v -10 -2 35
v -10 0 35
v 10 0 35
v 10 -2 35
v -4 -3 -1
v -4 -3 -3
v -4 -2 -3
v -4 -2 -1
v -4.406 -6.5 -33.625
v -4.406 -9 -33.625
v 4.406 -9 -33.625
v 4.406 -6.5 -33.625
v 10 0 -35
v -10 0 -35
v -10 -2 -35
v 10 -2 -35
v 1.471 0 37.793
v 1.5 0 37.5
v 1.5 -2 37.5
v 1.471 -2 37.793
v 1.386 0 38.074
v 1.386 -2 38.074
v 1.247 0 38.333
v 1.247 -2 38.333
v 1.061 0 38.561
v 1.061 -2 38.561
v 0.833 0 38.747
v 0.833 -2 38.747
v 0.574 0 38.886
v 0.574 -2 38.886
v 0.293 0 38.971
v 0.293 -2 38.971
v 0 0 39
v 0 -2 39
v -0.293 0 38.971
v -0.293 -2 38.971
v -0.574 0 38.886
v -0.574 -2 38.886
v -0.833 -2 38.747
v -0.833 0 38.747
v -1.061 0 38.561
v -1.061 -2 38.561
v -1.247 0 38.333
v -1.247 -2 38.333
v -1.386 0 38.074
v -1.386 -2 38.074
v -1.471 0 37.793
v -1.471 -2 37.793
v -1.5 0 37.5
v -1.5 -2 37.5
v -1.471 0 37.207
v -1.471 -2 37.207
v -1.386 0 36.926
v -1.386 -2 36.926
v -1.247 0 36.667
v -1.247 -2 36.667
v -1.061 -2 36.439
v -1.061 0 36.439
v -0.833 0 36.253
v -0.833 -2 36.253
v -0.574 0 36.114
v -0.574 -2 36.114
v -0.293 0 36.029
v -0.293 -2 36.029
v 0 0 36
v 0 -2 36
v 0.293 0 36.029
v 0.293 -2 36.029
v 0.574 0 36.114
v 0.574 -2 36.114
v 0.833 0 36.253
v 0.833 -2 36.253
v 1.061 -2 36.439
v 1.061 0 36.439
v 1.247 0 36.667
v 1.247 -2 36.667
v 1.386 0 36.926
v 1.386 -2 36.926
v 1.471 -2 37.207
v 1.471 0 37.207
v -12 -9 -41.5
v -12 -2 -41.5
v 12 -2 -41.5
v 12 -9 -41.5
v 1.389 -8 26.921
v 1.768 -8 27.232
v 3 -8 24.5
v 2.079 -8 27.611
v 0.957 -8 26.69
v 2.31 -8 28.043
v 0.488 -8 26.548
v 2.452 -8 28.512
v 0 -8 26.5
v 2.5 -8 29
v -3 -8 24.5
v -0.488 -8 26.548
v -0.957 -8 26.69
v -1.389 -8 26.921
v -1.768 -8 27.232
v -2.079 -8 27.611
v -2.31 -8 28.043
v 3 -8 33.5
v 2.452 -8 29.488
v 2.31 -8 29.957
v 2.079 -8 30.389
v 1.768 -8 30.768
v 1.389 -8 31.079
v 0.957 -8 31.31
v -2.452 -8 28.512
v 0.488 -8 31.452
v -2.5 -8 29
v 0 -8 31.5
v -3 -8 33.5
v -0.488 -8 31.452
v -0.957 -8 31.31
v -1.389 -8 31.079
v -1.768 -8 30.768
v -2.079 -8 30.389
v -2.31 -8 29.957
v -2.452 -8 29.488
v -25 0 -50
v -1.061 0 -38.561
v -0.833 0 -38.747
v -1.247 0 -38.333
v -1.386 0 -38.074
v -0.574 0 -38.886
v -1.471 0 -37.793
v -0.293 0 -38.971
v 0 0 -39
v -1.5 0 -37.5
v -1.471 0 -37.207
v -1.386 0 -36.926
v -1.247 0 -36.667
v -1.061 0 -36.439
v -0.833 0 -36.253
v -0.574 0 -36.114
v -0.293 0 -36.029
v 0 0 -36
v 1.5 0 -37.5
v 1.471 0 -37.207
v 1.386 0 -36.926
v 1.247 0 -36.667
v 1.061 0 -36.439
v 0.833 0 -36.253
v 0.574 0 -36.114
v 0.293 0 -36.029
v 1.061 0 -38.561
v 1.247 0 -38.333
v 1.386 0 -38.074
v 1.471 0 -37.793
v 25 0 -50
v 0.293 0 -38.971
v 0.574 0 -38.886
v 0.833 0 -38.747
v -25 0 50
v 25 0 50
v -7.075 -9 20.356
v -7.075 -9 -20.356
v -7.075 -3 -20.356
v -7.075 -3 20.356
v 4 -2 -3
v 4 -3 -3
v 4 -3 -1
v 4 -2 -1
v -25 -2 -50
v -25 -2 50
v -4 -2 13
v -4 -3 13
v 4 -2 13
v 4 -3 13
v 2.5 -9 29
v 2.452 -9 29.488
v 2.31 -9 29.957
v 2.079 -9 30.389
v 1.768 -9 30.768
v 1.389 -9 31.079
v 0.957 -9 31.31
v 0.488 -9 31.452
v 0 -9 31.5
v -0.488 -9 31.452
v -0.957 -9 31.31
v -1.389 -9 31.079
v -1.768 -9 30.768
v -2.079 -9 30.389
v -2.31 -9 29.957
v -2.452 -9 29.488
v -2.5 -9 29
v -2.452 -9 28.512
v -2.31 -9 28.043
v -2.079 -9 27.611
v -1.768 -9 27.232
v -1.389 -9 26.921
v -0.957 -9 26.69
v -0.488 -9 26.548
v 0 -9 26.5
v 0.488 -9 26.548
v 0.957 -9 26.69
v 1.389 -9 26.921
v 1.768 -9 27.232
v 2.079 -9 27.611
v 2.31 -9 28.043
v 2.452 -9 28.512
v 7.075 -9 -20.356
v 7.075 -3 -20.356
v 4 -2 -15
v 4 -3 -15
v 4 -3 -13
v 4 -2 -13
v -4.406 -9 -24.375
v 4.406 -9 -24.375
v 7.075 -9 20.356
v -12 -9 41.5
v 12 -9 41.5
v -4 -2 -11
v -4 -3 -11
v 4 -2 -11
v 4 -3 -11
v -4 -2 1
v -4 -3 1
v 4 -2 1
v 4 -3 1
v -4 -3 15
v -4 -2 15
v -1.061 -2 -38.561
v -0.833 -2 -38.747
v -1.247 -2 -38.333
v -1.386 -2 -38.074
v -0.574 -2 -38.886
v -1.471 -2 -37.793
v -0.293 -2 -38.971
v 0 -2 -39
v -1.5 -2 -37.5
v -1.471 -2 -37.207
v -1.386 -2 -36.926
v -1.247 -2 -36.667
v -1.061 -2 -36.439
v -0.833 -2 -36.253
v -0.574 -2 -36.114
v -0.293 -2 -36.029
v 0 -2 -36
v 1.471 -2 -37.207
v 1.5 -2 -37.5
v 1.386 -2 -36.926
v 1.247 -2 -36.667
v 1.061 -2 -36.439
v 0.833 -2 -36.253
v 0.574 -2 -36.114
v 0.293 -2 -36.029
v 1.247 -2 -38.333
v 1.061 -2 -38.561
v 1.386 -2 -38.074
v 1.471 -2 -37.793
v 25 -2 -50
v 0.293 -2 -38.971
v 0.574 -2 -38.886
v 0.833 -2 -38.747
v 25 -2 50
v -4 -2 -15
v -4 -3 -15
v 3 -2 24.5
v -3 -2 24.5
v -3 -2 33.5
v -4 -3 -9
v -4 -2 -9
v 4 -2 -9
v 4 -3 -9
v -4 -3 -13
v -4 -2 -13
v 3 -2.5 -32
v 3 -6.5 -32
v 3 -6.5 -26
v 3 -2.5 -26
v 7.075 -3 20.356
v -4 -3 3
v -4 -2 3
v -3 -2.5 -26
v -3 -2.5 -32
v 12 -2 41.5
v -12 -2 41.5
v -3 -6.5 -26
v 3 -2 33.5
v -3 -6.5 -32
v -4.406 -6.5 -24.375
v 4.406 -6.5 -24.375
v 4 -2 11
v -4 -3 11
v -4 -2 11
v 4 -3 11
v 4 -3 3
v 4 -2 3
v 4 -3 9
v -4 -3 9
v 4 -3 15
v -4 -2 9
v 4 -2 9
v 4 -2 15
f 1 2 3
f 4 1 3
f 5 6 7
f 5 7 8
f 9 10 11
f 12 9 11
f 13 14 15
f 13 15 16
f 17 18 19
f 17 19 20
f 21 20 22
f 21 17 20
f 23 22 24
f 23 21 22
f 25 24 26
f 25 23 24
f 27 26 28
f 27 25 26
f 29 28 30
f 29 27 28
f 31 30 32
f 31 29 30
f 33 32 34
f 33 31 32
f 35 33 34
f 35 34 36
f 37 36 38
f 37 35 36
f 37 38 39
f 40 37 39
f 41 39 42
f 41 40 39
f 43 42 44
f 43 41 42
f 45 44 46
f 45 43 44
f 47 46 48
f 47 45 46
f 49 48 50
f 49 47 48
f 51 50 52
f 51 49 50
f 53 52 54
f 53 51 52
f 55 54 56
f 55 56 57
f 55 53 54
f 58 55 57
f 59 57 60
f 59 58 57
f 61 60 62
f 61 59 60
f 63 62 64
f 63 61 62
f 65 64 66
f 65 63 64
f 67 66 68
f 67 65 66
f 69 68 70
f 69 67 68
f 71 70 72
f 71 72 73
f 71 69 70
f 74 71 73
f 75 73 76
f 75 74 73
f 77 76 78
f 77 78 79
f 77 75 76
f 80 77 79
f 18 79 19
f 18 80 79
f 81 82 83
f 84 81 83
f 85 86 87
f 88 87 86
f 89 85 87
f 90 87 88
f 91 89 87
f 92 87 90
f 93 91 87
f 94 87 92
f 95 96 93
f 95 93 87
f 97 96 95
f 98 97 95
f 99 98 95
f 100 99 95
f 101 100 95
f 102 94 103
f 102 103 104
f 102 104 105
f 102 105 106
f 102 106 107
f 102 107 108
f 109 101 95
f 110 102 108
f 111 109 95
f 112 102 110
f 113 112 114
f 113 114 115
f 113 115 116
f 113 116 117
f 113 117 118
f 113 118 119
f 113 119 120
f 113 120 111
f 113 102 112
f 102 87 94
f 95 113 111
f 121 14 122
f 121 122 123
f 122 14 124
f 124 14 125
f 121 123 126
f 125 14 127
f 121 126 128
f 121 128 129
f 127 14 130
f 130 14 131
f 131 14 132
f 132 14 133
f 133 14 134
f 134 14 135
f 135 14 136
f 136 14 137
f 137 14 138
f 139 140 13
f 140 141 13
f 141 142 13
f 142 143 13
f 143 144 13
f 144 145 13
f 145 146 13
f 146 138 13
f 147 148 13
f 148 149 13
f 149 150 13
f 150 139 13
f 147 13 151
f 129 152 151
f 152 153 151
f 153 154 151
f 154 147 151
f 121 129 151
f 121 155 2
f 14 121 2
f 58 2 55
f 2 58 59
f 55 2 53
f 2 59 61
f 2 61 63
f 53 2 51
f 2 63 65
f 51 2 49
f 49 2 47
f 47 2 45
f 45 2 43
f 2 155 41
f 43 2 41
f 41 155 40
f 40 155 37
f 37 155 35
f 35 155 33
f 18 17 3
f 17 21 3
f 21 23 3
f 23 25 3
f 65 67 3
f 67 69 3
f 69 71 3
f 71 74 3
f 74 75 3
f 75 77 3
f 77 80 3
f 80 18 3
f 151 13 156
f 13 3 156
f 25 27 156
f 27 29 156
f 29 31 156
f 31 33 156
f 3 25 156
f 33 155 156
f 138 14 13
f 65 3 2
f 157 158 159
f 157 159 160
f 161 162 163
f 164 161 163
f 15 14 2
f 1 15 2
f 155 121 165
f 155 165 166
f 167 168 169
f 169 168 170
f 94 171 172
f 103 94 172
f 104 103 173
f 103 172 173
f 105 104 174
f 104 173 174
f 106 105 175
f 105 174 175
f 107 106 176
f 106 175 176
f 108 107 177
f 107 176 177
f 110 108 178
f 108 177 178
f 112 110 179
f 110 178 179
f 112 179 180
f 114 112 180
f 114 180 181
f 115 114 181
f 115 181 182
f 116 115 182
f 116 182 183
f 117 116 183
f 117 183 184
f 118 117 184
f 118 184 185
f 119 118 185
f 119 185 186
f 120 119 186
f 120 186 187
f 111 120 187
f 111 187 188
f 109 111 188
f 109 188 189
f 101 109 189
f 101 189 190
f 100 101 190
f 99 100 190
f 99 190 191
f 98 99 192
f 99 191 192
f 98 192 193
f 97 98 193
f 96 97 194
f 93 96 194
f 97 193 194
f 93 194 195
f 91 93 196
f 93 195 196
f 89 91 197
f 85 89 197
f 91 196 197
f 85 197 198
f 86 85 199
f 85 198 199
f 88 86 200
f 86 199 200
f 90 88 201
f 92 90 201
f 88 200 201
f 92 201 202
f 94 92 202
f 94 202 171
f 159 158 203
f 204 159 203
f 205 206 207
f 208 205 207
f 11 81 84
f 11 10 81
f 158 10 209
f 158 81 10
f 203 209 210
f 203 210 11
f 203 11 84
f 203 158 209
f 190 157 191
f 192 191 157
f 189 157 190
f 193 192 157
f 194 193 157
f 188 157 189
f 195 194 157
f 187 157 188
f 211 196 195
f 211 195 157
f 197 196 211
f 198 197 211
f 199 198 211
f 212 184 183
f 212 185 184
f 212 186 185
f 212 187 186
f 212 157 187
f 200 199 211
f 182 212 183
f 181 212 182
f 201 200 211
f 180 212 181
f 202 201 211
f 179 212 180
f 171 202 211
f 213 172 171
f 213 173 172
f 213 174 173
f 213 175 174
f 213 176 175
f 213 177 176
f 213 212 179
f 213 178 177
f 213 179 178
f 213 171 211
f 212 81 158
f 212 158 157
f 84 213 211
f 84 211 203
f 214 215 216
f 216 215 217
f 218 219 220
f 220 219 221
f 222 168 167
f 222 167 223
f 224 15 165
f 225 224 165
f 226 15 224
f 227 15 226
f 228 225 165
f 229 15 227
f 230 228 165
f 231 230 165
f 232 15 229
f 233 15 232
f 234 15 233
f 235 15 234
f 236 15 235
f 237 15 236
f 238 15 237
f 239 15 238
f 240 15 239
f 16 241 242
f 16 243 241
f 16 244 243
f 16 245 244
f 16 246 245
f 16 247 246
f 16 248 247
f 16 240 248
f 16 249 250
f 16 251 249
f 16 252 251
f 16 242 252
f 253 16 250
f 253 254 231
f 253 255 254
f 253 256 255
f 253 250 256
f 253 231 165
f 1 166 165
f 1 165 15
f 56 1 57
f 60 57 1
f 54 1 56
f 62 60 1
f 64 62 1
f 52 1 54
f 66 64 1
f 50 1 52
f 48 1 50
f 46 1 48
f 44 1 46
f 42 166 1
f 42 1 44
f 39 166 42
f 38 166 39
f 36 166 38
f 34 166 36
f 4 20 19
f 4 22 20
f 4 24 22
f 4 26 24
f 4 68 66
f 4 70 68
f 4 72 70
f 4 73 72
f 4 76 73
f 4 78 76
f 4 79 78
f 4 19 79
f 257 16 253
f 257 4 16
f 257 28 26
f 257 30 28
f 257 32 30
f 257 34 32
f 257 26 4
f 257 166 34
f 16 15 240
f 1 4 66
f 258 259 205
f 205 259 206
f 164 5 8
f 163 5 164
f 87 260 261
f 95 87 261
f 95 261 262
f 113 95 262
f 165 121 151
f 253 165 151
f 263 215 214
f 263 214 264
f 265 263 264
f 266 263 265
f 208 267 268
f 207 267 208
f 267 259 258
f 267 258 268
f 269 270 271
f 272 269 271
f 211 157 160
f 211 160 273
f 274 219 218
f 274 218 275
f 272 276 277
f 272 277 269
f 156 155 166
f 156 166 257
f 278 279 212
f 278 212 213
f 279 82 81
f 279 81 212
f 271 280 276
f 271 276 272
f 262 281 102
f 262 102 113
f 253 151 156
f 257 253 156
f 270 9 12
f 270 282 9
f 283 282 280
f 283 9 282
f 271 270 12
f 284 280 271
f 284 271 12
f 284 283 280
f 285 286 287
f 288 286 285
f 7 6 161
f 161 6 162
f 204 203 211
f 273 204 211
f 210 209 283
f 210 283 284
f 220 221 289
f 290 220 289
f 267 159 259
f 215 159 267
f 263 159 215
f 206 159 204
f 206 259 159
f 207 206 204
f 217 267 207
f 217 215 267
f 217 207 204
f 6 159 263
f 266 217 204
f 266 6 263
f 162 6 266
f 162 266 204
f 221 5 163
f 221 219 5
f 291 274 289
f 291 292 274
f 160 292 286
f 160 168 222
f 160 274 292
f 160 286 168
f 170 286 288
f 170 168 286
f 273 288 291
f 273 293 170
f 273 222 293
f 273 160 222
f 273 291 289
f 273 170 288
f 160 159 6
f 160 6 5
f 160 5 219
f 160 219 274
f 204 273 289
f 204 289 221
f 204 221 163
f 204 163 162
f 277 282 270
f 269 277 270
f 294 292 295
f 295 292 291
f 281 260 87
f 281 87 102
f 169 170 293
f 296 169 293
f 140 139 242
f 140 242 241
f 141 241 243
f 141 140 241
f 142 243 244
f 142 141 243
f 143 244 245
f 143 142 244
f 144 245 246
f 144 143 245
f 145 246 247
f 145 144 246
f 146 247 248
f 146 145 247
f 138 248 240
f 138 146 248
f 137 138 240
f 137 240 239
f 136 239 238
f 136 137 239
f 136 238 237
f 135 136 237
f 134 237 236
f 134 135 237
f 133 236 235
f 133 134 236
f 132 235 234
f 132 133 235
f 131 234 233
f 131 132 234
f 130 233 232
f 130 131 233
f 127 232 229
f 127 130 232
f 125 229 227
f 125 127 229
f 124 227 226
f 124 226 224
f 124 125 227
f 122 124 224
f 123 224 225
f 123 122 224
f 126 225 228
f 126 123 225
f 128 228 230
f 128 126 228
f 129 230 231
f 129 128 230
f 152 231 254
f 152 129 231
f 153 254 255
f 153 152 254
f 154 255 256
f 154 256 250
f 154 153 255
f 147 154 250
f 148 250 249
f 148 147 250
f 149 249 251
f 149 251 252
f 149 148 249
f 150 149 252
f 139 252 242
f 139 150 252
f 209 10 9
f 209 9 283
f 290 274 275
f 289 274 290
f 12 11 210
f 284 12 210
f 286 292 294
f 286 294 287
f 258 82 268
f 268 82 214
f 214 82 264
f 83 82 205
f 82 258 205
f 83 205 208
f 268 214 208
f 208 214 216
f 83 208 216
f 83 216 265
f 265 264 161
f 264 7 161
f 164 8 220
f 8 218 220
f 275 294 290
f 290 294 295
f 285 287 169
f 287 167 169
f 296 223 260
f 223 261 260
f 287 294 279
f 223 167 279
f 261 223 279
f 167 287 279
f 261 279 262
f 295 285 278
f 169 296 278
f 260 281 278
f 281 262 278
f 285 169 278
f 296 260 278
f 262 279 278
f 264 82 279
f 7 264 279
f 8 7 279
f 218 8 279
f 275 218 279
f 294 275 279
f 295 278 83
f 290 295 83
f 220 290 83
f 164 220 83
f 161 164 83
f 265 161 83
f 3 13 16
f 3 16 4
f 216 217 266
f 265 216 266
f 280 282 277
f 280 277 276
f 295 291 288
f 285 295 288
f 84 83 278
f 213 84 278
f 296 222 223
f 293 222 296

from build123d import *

# Parameters (mm, degrees)
F0_W      = 50
F0_H      = 100
F0_R      = 1.5
F0_W_2    = 20
F0_H_2    = 70
F1_DEPTH  = 2
F3_W      = 24
F3_H      = 83
F4_DEPTH  = 7
F5_R      = 2.5
F6_DEPTH  = 5
F7_W      = 6
F7_H      = 9
F8_DEPTH  = 6
F9_W      = 8
F9_H      = 2
F10_DEPTH = 10
F11_W     = 14.149758
F11_H     = 40.712248
F12_DEPTH = 6
F13_W     = 6
F13_H     = 6
F14_DEPTH = 6.5
F15_W     = 8.812208
F15_H     = 9.249864
F16_DEPTH = 2.5


with BuildPart() as f1:
    # F0 (on Front) → F1 (new body)
    with BuildSketch(Plane.XZ):
        Rectangle(F0_W, F0_H)
        with Locations((0, -37.5)):
            Circle(F0_R, mode=Mode.SUBTRACT)
        Rectangle(F0_W_2, F0_H_2, mode=Mode.SUBTRACT)
        with Locations((0, 37.5)):
            Circle(F0_R, mode=Mode.SUBTRACT)
    extrude(amount=F1_DEPTH)


with BuildPart() as f4:
    # F3 (on offset) → F4 (new body)
    with BuildSketch(Plane.XZ.offset(2)):
        Rectangle(F3_W, F3_H)
    extrude(amount=F4_DEPTH)

    # F5 (on face) → F6 (cut)
    with BuildSketch(Plane.XZ.offset(9)):
        with Locations((0, 29)):
            Circle(F5_R)
    extrude(amount=-F6_DEPTH, mode=Mode.SUBTRACT)

    # F7 (on face) → F8 (cut)
    with BuildSketch(Plane(origin=(0, -2, 0), x_dir=(-1, 0, 0), z_dir=(0, 1, 0))):
        with Locations((0, 29)):
            Rectangle(F7_W, F7_H)
    extrude(amount=-F8_DEPTH, mode=Mode.SUBTRACT)

    # F9 (on face) → F10 (cut)
    with BuildSketch(Plane.XZ.offset(9)):
        with Locations((0, 14)):
            Rectangle(F9_W, F9_H)
        with Locations((0, 10)):
            Rectangle(F9_W, F9_H)
        with Locations((0, 2)):
            Rectangle(F9_W, F9_H)
        with Locations((0, -2)):
            Rectangle(F9_W, F9_H)
        with Locations((0, -10)):
            Rectangle(F9_W, F9_H)
        with Locations((0, -14)):
            Rectangle(F9_W, F9_H)
    extrude(amount=-F10_DEPTH, mode=Mode.SUBTRACT)

    # F11 (on face) → F12 (cut)
    with BuildSketch(Plane.XZ.offset(9)):
        Rectangle(F11_W, F11_H)
    extrude(amount=-F12_DEPTH, mode=Mode.SUBTRACT)

    # F13 (on face) → F14 (cut)
    with BuildSketch(Plane.XZ.offset(9)):
        with Locations((0, -29)):
            Rectangle(F13_W, F13_H)
    extrude(amount=-F14_DEPTH, mode=Mode.SUBTRACT)

    # F15 (on face) → F16 (cut)
    with BuildSketch(Plane.XZ.offset(9)):
        with Locations((0, -29)):
            Rectangle(F15_W, F15_H)
    extrude(amount=-F16_DEPTH, mode=Mode.SUBTRACT)


solid = Compound([f1.part, f4.part])
